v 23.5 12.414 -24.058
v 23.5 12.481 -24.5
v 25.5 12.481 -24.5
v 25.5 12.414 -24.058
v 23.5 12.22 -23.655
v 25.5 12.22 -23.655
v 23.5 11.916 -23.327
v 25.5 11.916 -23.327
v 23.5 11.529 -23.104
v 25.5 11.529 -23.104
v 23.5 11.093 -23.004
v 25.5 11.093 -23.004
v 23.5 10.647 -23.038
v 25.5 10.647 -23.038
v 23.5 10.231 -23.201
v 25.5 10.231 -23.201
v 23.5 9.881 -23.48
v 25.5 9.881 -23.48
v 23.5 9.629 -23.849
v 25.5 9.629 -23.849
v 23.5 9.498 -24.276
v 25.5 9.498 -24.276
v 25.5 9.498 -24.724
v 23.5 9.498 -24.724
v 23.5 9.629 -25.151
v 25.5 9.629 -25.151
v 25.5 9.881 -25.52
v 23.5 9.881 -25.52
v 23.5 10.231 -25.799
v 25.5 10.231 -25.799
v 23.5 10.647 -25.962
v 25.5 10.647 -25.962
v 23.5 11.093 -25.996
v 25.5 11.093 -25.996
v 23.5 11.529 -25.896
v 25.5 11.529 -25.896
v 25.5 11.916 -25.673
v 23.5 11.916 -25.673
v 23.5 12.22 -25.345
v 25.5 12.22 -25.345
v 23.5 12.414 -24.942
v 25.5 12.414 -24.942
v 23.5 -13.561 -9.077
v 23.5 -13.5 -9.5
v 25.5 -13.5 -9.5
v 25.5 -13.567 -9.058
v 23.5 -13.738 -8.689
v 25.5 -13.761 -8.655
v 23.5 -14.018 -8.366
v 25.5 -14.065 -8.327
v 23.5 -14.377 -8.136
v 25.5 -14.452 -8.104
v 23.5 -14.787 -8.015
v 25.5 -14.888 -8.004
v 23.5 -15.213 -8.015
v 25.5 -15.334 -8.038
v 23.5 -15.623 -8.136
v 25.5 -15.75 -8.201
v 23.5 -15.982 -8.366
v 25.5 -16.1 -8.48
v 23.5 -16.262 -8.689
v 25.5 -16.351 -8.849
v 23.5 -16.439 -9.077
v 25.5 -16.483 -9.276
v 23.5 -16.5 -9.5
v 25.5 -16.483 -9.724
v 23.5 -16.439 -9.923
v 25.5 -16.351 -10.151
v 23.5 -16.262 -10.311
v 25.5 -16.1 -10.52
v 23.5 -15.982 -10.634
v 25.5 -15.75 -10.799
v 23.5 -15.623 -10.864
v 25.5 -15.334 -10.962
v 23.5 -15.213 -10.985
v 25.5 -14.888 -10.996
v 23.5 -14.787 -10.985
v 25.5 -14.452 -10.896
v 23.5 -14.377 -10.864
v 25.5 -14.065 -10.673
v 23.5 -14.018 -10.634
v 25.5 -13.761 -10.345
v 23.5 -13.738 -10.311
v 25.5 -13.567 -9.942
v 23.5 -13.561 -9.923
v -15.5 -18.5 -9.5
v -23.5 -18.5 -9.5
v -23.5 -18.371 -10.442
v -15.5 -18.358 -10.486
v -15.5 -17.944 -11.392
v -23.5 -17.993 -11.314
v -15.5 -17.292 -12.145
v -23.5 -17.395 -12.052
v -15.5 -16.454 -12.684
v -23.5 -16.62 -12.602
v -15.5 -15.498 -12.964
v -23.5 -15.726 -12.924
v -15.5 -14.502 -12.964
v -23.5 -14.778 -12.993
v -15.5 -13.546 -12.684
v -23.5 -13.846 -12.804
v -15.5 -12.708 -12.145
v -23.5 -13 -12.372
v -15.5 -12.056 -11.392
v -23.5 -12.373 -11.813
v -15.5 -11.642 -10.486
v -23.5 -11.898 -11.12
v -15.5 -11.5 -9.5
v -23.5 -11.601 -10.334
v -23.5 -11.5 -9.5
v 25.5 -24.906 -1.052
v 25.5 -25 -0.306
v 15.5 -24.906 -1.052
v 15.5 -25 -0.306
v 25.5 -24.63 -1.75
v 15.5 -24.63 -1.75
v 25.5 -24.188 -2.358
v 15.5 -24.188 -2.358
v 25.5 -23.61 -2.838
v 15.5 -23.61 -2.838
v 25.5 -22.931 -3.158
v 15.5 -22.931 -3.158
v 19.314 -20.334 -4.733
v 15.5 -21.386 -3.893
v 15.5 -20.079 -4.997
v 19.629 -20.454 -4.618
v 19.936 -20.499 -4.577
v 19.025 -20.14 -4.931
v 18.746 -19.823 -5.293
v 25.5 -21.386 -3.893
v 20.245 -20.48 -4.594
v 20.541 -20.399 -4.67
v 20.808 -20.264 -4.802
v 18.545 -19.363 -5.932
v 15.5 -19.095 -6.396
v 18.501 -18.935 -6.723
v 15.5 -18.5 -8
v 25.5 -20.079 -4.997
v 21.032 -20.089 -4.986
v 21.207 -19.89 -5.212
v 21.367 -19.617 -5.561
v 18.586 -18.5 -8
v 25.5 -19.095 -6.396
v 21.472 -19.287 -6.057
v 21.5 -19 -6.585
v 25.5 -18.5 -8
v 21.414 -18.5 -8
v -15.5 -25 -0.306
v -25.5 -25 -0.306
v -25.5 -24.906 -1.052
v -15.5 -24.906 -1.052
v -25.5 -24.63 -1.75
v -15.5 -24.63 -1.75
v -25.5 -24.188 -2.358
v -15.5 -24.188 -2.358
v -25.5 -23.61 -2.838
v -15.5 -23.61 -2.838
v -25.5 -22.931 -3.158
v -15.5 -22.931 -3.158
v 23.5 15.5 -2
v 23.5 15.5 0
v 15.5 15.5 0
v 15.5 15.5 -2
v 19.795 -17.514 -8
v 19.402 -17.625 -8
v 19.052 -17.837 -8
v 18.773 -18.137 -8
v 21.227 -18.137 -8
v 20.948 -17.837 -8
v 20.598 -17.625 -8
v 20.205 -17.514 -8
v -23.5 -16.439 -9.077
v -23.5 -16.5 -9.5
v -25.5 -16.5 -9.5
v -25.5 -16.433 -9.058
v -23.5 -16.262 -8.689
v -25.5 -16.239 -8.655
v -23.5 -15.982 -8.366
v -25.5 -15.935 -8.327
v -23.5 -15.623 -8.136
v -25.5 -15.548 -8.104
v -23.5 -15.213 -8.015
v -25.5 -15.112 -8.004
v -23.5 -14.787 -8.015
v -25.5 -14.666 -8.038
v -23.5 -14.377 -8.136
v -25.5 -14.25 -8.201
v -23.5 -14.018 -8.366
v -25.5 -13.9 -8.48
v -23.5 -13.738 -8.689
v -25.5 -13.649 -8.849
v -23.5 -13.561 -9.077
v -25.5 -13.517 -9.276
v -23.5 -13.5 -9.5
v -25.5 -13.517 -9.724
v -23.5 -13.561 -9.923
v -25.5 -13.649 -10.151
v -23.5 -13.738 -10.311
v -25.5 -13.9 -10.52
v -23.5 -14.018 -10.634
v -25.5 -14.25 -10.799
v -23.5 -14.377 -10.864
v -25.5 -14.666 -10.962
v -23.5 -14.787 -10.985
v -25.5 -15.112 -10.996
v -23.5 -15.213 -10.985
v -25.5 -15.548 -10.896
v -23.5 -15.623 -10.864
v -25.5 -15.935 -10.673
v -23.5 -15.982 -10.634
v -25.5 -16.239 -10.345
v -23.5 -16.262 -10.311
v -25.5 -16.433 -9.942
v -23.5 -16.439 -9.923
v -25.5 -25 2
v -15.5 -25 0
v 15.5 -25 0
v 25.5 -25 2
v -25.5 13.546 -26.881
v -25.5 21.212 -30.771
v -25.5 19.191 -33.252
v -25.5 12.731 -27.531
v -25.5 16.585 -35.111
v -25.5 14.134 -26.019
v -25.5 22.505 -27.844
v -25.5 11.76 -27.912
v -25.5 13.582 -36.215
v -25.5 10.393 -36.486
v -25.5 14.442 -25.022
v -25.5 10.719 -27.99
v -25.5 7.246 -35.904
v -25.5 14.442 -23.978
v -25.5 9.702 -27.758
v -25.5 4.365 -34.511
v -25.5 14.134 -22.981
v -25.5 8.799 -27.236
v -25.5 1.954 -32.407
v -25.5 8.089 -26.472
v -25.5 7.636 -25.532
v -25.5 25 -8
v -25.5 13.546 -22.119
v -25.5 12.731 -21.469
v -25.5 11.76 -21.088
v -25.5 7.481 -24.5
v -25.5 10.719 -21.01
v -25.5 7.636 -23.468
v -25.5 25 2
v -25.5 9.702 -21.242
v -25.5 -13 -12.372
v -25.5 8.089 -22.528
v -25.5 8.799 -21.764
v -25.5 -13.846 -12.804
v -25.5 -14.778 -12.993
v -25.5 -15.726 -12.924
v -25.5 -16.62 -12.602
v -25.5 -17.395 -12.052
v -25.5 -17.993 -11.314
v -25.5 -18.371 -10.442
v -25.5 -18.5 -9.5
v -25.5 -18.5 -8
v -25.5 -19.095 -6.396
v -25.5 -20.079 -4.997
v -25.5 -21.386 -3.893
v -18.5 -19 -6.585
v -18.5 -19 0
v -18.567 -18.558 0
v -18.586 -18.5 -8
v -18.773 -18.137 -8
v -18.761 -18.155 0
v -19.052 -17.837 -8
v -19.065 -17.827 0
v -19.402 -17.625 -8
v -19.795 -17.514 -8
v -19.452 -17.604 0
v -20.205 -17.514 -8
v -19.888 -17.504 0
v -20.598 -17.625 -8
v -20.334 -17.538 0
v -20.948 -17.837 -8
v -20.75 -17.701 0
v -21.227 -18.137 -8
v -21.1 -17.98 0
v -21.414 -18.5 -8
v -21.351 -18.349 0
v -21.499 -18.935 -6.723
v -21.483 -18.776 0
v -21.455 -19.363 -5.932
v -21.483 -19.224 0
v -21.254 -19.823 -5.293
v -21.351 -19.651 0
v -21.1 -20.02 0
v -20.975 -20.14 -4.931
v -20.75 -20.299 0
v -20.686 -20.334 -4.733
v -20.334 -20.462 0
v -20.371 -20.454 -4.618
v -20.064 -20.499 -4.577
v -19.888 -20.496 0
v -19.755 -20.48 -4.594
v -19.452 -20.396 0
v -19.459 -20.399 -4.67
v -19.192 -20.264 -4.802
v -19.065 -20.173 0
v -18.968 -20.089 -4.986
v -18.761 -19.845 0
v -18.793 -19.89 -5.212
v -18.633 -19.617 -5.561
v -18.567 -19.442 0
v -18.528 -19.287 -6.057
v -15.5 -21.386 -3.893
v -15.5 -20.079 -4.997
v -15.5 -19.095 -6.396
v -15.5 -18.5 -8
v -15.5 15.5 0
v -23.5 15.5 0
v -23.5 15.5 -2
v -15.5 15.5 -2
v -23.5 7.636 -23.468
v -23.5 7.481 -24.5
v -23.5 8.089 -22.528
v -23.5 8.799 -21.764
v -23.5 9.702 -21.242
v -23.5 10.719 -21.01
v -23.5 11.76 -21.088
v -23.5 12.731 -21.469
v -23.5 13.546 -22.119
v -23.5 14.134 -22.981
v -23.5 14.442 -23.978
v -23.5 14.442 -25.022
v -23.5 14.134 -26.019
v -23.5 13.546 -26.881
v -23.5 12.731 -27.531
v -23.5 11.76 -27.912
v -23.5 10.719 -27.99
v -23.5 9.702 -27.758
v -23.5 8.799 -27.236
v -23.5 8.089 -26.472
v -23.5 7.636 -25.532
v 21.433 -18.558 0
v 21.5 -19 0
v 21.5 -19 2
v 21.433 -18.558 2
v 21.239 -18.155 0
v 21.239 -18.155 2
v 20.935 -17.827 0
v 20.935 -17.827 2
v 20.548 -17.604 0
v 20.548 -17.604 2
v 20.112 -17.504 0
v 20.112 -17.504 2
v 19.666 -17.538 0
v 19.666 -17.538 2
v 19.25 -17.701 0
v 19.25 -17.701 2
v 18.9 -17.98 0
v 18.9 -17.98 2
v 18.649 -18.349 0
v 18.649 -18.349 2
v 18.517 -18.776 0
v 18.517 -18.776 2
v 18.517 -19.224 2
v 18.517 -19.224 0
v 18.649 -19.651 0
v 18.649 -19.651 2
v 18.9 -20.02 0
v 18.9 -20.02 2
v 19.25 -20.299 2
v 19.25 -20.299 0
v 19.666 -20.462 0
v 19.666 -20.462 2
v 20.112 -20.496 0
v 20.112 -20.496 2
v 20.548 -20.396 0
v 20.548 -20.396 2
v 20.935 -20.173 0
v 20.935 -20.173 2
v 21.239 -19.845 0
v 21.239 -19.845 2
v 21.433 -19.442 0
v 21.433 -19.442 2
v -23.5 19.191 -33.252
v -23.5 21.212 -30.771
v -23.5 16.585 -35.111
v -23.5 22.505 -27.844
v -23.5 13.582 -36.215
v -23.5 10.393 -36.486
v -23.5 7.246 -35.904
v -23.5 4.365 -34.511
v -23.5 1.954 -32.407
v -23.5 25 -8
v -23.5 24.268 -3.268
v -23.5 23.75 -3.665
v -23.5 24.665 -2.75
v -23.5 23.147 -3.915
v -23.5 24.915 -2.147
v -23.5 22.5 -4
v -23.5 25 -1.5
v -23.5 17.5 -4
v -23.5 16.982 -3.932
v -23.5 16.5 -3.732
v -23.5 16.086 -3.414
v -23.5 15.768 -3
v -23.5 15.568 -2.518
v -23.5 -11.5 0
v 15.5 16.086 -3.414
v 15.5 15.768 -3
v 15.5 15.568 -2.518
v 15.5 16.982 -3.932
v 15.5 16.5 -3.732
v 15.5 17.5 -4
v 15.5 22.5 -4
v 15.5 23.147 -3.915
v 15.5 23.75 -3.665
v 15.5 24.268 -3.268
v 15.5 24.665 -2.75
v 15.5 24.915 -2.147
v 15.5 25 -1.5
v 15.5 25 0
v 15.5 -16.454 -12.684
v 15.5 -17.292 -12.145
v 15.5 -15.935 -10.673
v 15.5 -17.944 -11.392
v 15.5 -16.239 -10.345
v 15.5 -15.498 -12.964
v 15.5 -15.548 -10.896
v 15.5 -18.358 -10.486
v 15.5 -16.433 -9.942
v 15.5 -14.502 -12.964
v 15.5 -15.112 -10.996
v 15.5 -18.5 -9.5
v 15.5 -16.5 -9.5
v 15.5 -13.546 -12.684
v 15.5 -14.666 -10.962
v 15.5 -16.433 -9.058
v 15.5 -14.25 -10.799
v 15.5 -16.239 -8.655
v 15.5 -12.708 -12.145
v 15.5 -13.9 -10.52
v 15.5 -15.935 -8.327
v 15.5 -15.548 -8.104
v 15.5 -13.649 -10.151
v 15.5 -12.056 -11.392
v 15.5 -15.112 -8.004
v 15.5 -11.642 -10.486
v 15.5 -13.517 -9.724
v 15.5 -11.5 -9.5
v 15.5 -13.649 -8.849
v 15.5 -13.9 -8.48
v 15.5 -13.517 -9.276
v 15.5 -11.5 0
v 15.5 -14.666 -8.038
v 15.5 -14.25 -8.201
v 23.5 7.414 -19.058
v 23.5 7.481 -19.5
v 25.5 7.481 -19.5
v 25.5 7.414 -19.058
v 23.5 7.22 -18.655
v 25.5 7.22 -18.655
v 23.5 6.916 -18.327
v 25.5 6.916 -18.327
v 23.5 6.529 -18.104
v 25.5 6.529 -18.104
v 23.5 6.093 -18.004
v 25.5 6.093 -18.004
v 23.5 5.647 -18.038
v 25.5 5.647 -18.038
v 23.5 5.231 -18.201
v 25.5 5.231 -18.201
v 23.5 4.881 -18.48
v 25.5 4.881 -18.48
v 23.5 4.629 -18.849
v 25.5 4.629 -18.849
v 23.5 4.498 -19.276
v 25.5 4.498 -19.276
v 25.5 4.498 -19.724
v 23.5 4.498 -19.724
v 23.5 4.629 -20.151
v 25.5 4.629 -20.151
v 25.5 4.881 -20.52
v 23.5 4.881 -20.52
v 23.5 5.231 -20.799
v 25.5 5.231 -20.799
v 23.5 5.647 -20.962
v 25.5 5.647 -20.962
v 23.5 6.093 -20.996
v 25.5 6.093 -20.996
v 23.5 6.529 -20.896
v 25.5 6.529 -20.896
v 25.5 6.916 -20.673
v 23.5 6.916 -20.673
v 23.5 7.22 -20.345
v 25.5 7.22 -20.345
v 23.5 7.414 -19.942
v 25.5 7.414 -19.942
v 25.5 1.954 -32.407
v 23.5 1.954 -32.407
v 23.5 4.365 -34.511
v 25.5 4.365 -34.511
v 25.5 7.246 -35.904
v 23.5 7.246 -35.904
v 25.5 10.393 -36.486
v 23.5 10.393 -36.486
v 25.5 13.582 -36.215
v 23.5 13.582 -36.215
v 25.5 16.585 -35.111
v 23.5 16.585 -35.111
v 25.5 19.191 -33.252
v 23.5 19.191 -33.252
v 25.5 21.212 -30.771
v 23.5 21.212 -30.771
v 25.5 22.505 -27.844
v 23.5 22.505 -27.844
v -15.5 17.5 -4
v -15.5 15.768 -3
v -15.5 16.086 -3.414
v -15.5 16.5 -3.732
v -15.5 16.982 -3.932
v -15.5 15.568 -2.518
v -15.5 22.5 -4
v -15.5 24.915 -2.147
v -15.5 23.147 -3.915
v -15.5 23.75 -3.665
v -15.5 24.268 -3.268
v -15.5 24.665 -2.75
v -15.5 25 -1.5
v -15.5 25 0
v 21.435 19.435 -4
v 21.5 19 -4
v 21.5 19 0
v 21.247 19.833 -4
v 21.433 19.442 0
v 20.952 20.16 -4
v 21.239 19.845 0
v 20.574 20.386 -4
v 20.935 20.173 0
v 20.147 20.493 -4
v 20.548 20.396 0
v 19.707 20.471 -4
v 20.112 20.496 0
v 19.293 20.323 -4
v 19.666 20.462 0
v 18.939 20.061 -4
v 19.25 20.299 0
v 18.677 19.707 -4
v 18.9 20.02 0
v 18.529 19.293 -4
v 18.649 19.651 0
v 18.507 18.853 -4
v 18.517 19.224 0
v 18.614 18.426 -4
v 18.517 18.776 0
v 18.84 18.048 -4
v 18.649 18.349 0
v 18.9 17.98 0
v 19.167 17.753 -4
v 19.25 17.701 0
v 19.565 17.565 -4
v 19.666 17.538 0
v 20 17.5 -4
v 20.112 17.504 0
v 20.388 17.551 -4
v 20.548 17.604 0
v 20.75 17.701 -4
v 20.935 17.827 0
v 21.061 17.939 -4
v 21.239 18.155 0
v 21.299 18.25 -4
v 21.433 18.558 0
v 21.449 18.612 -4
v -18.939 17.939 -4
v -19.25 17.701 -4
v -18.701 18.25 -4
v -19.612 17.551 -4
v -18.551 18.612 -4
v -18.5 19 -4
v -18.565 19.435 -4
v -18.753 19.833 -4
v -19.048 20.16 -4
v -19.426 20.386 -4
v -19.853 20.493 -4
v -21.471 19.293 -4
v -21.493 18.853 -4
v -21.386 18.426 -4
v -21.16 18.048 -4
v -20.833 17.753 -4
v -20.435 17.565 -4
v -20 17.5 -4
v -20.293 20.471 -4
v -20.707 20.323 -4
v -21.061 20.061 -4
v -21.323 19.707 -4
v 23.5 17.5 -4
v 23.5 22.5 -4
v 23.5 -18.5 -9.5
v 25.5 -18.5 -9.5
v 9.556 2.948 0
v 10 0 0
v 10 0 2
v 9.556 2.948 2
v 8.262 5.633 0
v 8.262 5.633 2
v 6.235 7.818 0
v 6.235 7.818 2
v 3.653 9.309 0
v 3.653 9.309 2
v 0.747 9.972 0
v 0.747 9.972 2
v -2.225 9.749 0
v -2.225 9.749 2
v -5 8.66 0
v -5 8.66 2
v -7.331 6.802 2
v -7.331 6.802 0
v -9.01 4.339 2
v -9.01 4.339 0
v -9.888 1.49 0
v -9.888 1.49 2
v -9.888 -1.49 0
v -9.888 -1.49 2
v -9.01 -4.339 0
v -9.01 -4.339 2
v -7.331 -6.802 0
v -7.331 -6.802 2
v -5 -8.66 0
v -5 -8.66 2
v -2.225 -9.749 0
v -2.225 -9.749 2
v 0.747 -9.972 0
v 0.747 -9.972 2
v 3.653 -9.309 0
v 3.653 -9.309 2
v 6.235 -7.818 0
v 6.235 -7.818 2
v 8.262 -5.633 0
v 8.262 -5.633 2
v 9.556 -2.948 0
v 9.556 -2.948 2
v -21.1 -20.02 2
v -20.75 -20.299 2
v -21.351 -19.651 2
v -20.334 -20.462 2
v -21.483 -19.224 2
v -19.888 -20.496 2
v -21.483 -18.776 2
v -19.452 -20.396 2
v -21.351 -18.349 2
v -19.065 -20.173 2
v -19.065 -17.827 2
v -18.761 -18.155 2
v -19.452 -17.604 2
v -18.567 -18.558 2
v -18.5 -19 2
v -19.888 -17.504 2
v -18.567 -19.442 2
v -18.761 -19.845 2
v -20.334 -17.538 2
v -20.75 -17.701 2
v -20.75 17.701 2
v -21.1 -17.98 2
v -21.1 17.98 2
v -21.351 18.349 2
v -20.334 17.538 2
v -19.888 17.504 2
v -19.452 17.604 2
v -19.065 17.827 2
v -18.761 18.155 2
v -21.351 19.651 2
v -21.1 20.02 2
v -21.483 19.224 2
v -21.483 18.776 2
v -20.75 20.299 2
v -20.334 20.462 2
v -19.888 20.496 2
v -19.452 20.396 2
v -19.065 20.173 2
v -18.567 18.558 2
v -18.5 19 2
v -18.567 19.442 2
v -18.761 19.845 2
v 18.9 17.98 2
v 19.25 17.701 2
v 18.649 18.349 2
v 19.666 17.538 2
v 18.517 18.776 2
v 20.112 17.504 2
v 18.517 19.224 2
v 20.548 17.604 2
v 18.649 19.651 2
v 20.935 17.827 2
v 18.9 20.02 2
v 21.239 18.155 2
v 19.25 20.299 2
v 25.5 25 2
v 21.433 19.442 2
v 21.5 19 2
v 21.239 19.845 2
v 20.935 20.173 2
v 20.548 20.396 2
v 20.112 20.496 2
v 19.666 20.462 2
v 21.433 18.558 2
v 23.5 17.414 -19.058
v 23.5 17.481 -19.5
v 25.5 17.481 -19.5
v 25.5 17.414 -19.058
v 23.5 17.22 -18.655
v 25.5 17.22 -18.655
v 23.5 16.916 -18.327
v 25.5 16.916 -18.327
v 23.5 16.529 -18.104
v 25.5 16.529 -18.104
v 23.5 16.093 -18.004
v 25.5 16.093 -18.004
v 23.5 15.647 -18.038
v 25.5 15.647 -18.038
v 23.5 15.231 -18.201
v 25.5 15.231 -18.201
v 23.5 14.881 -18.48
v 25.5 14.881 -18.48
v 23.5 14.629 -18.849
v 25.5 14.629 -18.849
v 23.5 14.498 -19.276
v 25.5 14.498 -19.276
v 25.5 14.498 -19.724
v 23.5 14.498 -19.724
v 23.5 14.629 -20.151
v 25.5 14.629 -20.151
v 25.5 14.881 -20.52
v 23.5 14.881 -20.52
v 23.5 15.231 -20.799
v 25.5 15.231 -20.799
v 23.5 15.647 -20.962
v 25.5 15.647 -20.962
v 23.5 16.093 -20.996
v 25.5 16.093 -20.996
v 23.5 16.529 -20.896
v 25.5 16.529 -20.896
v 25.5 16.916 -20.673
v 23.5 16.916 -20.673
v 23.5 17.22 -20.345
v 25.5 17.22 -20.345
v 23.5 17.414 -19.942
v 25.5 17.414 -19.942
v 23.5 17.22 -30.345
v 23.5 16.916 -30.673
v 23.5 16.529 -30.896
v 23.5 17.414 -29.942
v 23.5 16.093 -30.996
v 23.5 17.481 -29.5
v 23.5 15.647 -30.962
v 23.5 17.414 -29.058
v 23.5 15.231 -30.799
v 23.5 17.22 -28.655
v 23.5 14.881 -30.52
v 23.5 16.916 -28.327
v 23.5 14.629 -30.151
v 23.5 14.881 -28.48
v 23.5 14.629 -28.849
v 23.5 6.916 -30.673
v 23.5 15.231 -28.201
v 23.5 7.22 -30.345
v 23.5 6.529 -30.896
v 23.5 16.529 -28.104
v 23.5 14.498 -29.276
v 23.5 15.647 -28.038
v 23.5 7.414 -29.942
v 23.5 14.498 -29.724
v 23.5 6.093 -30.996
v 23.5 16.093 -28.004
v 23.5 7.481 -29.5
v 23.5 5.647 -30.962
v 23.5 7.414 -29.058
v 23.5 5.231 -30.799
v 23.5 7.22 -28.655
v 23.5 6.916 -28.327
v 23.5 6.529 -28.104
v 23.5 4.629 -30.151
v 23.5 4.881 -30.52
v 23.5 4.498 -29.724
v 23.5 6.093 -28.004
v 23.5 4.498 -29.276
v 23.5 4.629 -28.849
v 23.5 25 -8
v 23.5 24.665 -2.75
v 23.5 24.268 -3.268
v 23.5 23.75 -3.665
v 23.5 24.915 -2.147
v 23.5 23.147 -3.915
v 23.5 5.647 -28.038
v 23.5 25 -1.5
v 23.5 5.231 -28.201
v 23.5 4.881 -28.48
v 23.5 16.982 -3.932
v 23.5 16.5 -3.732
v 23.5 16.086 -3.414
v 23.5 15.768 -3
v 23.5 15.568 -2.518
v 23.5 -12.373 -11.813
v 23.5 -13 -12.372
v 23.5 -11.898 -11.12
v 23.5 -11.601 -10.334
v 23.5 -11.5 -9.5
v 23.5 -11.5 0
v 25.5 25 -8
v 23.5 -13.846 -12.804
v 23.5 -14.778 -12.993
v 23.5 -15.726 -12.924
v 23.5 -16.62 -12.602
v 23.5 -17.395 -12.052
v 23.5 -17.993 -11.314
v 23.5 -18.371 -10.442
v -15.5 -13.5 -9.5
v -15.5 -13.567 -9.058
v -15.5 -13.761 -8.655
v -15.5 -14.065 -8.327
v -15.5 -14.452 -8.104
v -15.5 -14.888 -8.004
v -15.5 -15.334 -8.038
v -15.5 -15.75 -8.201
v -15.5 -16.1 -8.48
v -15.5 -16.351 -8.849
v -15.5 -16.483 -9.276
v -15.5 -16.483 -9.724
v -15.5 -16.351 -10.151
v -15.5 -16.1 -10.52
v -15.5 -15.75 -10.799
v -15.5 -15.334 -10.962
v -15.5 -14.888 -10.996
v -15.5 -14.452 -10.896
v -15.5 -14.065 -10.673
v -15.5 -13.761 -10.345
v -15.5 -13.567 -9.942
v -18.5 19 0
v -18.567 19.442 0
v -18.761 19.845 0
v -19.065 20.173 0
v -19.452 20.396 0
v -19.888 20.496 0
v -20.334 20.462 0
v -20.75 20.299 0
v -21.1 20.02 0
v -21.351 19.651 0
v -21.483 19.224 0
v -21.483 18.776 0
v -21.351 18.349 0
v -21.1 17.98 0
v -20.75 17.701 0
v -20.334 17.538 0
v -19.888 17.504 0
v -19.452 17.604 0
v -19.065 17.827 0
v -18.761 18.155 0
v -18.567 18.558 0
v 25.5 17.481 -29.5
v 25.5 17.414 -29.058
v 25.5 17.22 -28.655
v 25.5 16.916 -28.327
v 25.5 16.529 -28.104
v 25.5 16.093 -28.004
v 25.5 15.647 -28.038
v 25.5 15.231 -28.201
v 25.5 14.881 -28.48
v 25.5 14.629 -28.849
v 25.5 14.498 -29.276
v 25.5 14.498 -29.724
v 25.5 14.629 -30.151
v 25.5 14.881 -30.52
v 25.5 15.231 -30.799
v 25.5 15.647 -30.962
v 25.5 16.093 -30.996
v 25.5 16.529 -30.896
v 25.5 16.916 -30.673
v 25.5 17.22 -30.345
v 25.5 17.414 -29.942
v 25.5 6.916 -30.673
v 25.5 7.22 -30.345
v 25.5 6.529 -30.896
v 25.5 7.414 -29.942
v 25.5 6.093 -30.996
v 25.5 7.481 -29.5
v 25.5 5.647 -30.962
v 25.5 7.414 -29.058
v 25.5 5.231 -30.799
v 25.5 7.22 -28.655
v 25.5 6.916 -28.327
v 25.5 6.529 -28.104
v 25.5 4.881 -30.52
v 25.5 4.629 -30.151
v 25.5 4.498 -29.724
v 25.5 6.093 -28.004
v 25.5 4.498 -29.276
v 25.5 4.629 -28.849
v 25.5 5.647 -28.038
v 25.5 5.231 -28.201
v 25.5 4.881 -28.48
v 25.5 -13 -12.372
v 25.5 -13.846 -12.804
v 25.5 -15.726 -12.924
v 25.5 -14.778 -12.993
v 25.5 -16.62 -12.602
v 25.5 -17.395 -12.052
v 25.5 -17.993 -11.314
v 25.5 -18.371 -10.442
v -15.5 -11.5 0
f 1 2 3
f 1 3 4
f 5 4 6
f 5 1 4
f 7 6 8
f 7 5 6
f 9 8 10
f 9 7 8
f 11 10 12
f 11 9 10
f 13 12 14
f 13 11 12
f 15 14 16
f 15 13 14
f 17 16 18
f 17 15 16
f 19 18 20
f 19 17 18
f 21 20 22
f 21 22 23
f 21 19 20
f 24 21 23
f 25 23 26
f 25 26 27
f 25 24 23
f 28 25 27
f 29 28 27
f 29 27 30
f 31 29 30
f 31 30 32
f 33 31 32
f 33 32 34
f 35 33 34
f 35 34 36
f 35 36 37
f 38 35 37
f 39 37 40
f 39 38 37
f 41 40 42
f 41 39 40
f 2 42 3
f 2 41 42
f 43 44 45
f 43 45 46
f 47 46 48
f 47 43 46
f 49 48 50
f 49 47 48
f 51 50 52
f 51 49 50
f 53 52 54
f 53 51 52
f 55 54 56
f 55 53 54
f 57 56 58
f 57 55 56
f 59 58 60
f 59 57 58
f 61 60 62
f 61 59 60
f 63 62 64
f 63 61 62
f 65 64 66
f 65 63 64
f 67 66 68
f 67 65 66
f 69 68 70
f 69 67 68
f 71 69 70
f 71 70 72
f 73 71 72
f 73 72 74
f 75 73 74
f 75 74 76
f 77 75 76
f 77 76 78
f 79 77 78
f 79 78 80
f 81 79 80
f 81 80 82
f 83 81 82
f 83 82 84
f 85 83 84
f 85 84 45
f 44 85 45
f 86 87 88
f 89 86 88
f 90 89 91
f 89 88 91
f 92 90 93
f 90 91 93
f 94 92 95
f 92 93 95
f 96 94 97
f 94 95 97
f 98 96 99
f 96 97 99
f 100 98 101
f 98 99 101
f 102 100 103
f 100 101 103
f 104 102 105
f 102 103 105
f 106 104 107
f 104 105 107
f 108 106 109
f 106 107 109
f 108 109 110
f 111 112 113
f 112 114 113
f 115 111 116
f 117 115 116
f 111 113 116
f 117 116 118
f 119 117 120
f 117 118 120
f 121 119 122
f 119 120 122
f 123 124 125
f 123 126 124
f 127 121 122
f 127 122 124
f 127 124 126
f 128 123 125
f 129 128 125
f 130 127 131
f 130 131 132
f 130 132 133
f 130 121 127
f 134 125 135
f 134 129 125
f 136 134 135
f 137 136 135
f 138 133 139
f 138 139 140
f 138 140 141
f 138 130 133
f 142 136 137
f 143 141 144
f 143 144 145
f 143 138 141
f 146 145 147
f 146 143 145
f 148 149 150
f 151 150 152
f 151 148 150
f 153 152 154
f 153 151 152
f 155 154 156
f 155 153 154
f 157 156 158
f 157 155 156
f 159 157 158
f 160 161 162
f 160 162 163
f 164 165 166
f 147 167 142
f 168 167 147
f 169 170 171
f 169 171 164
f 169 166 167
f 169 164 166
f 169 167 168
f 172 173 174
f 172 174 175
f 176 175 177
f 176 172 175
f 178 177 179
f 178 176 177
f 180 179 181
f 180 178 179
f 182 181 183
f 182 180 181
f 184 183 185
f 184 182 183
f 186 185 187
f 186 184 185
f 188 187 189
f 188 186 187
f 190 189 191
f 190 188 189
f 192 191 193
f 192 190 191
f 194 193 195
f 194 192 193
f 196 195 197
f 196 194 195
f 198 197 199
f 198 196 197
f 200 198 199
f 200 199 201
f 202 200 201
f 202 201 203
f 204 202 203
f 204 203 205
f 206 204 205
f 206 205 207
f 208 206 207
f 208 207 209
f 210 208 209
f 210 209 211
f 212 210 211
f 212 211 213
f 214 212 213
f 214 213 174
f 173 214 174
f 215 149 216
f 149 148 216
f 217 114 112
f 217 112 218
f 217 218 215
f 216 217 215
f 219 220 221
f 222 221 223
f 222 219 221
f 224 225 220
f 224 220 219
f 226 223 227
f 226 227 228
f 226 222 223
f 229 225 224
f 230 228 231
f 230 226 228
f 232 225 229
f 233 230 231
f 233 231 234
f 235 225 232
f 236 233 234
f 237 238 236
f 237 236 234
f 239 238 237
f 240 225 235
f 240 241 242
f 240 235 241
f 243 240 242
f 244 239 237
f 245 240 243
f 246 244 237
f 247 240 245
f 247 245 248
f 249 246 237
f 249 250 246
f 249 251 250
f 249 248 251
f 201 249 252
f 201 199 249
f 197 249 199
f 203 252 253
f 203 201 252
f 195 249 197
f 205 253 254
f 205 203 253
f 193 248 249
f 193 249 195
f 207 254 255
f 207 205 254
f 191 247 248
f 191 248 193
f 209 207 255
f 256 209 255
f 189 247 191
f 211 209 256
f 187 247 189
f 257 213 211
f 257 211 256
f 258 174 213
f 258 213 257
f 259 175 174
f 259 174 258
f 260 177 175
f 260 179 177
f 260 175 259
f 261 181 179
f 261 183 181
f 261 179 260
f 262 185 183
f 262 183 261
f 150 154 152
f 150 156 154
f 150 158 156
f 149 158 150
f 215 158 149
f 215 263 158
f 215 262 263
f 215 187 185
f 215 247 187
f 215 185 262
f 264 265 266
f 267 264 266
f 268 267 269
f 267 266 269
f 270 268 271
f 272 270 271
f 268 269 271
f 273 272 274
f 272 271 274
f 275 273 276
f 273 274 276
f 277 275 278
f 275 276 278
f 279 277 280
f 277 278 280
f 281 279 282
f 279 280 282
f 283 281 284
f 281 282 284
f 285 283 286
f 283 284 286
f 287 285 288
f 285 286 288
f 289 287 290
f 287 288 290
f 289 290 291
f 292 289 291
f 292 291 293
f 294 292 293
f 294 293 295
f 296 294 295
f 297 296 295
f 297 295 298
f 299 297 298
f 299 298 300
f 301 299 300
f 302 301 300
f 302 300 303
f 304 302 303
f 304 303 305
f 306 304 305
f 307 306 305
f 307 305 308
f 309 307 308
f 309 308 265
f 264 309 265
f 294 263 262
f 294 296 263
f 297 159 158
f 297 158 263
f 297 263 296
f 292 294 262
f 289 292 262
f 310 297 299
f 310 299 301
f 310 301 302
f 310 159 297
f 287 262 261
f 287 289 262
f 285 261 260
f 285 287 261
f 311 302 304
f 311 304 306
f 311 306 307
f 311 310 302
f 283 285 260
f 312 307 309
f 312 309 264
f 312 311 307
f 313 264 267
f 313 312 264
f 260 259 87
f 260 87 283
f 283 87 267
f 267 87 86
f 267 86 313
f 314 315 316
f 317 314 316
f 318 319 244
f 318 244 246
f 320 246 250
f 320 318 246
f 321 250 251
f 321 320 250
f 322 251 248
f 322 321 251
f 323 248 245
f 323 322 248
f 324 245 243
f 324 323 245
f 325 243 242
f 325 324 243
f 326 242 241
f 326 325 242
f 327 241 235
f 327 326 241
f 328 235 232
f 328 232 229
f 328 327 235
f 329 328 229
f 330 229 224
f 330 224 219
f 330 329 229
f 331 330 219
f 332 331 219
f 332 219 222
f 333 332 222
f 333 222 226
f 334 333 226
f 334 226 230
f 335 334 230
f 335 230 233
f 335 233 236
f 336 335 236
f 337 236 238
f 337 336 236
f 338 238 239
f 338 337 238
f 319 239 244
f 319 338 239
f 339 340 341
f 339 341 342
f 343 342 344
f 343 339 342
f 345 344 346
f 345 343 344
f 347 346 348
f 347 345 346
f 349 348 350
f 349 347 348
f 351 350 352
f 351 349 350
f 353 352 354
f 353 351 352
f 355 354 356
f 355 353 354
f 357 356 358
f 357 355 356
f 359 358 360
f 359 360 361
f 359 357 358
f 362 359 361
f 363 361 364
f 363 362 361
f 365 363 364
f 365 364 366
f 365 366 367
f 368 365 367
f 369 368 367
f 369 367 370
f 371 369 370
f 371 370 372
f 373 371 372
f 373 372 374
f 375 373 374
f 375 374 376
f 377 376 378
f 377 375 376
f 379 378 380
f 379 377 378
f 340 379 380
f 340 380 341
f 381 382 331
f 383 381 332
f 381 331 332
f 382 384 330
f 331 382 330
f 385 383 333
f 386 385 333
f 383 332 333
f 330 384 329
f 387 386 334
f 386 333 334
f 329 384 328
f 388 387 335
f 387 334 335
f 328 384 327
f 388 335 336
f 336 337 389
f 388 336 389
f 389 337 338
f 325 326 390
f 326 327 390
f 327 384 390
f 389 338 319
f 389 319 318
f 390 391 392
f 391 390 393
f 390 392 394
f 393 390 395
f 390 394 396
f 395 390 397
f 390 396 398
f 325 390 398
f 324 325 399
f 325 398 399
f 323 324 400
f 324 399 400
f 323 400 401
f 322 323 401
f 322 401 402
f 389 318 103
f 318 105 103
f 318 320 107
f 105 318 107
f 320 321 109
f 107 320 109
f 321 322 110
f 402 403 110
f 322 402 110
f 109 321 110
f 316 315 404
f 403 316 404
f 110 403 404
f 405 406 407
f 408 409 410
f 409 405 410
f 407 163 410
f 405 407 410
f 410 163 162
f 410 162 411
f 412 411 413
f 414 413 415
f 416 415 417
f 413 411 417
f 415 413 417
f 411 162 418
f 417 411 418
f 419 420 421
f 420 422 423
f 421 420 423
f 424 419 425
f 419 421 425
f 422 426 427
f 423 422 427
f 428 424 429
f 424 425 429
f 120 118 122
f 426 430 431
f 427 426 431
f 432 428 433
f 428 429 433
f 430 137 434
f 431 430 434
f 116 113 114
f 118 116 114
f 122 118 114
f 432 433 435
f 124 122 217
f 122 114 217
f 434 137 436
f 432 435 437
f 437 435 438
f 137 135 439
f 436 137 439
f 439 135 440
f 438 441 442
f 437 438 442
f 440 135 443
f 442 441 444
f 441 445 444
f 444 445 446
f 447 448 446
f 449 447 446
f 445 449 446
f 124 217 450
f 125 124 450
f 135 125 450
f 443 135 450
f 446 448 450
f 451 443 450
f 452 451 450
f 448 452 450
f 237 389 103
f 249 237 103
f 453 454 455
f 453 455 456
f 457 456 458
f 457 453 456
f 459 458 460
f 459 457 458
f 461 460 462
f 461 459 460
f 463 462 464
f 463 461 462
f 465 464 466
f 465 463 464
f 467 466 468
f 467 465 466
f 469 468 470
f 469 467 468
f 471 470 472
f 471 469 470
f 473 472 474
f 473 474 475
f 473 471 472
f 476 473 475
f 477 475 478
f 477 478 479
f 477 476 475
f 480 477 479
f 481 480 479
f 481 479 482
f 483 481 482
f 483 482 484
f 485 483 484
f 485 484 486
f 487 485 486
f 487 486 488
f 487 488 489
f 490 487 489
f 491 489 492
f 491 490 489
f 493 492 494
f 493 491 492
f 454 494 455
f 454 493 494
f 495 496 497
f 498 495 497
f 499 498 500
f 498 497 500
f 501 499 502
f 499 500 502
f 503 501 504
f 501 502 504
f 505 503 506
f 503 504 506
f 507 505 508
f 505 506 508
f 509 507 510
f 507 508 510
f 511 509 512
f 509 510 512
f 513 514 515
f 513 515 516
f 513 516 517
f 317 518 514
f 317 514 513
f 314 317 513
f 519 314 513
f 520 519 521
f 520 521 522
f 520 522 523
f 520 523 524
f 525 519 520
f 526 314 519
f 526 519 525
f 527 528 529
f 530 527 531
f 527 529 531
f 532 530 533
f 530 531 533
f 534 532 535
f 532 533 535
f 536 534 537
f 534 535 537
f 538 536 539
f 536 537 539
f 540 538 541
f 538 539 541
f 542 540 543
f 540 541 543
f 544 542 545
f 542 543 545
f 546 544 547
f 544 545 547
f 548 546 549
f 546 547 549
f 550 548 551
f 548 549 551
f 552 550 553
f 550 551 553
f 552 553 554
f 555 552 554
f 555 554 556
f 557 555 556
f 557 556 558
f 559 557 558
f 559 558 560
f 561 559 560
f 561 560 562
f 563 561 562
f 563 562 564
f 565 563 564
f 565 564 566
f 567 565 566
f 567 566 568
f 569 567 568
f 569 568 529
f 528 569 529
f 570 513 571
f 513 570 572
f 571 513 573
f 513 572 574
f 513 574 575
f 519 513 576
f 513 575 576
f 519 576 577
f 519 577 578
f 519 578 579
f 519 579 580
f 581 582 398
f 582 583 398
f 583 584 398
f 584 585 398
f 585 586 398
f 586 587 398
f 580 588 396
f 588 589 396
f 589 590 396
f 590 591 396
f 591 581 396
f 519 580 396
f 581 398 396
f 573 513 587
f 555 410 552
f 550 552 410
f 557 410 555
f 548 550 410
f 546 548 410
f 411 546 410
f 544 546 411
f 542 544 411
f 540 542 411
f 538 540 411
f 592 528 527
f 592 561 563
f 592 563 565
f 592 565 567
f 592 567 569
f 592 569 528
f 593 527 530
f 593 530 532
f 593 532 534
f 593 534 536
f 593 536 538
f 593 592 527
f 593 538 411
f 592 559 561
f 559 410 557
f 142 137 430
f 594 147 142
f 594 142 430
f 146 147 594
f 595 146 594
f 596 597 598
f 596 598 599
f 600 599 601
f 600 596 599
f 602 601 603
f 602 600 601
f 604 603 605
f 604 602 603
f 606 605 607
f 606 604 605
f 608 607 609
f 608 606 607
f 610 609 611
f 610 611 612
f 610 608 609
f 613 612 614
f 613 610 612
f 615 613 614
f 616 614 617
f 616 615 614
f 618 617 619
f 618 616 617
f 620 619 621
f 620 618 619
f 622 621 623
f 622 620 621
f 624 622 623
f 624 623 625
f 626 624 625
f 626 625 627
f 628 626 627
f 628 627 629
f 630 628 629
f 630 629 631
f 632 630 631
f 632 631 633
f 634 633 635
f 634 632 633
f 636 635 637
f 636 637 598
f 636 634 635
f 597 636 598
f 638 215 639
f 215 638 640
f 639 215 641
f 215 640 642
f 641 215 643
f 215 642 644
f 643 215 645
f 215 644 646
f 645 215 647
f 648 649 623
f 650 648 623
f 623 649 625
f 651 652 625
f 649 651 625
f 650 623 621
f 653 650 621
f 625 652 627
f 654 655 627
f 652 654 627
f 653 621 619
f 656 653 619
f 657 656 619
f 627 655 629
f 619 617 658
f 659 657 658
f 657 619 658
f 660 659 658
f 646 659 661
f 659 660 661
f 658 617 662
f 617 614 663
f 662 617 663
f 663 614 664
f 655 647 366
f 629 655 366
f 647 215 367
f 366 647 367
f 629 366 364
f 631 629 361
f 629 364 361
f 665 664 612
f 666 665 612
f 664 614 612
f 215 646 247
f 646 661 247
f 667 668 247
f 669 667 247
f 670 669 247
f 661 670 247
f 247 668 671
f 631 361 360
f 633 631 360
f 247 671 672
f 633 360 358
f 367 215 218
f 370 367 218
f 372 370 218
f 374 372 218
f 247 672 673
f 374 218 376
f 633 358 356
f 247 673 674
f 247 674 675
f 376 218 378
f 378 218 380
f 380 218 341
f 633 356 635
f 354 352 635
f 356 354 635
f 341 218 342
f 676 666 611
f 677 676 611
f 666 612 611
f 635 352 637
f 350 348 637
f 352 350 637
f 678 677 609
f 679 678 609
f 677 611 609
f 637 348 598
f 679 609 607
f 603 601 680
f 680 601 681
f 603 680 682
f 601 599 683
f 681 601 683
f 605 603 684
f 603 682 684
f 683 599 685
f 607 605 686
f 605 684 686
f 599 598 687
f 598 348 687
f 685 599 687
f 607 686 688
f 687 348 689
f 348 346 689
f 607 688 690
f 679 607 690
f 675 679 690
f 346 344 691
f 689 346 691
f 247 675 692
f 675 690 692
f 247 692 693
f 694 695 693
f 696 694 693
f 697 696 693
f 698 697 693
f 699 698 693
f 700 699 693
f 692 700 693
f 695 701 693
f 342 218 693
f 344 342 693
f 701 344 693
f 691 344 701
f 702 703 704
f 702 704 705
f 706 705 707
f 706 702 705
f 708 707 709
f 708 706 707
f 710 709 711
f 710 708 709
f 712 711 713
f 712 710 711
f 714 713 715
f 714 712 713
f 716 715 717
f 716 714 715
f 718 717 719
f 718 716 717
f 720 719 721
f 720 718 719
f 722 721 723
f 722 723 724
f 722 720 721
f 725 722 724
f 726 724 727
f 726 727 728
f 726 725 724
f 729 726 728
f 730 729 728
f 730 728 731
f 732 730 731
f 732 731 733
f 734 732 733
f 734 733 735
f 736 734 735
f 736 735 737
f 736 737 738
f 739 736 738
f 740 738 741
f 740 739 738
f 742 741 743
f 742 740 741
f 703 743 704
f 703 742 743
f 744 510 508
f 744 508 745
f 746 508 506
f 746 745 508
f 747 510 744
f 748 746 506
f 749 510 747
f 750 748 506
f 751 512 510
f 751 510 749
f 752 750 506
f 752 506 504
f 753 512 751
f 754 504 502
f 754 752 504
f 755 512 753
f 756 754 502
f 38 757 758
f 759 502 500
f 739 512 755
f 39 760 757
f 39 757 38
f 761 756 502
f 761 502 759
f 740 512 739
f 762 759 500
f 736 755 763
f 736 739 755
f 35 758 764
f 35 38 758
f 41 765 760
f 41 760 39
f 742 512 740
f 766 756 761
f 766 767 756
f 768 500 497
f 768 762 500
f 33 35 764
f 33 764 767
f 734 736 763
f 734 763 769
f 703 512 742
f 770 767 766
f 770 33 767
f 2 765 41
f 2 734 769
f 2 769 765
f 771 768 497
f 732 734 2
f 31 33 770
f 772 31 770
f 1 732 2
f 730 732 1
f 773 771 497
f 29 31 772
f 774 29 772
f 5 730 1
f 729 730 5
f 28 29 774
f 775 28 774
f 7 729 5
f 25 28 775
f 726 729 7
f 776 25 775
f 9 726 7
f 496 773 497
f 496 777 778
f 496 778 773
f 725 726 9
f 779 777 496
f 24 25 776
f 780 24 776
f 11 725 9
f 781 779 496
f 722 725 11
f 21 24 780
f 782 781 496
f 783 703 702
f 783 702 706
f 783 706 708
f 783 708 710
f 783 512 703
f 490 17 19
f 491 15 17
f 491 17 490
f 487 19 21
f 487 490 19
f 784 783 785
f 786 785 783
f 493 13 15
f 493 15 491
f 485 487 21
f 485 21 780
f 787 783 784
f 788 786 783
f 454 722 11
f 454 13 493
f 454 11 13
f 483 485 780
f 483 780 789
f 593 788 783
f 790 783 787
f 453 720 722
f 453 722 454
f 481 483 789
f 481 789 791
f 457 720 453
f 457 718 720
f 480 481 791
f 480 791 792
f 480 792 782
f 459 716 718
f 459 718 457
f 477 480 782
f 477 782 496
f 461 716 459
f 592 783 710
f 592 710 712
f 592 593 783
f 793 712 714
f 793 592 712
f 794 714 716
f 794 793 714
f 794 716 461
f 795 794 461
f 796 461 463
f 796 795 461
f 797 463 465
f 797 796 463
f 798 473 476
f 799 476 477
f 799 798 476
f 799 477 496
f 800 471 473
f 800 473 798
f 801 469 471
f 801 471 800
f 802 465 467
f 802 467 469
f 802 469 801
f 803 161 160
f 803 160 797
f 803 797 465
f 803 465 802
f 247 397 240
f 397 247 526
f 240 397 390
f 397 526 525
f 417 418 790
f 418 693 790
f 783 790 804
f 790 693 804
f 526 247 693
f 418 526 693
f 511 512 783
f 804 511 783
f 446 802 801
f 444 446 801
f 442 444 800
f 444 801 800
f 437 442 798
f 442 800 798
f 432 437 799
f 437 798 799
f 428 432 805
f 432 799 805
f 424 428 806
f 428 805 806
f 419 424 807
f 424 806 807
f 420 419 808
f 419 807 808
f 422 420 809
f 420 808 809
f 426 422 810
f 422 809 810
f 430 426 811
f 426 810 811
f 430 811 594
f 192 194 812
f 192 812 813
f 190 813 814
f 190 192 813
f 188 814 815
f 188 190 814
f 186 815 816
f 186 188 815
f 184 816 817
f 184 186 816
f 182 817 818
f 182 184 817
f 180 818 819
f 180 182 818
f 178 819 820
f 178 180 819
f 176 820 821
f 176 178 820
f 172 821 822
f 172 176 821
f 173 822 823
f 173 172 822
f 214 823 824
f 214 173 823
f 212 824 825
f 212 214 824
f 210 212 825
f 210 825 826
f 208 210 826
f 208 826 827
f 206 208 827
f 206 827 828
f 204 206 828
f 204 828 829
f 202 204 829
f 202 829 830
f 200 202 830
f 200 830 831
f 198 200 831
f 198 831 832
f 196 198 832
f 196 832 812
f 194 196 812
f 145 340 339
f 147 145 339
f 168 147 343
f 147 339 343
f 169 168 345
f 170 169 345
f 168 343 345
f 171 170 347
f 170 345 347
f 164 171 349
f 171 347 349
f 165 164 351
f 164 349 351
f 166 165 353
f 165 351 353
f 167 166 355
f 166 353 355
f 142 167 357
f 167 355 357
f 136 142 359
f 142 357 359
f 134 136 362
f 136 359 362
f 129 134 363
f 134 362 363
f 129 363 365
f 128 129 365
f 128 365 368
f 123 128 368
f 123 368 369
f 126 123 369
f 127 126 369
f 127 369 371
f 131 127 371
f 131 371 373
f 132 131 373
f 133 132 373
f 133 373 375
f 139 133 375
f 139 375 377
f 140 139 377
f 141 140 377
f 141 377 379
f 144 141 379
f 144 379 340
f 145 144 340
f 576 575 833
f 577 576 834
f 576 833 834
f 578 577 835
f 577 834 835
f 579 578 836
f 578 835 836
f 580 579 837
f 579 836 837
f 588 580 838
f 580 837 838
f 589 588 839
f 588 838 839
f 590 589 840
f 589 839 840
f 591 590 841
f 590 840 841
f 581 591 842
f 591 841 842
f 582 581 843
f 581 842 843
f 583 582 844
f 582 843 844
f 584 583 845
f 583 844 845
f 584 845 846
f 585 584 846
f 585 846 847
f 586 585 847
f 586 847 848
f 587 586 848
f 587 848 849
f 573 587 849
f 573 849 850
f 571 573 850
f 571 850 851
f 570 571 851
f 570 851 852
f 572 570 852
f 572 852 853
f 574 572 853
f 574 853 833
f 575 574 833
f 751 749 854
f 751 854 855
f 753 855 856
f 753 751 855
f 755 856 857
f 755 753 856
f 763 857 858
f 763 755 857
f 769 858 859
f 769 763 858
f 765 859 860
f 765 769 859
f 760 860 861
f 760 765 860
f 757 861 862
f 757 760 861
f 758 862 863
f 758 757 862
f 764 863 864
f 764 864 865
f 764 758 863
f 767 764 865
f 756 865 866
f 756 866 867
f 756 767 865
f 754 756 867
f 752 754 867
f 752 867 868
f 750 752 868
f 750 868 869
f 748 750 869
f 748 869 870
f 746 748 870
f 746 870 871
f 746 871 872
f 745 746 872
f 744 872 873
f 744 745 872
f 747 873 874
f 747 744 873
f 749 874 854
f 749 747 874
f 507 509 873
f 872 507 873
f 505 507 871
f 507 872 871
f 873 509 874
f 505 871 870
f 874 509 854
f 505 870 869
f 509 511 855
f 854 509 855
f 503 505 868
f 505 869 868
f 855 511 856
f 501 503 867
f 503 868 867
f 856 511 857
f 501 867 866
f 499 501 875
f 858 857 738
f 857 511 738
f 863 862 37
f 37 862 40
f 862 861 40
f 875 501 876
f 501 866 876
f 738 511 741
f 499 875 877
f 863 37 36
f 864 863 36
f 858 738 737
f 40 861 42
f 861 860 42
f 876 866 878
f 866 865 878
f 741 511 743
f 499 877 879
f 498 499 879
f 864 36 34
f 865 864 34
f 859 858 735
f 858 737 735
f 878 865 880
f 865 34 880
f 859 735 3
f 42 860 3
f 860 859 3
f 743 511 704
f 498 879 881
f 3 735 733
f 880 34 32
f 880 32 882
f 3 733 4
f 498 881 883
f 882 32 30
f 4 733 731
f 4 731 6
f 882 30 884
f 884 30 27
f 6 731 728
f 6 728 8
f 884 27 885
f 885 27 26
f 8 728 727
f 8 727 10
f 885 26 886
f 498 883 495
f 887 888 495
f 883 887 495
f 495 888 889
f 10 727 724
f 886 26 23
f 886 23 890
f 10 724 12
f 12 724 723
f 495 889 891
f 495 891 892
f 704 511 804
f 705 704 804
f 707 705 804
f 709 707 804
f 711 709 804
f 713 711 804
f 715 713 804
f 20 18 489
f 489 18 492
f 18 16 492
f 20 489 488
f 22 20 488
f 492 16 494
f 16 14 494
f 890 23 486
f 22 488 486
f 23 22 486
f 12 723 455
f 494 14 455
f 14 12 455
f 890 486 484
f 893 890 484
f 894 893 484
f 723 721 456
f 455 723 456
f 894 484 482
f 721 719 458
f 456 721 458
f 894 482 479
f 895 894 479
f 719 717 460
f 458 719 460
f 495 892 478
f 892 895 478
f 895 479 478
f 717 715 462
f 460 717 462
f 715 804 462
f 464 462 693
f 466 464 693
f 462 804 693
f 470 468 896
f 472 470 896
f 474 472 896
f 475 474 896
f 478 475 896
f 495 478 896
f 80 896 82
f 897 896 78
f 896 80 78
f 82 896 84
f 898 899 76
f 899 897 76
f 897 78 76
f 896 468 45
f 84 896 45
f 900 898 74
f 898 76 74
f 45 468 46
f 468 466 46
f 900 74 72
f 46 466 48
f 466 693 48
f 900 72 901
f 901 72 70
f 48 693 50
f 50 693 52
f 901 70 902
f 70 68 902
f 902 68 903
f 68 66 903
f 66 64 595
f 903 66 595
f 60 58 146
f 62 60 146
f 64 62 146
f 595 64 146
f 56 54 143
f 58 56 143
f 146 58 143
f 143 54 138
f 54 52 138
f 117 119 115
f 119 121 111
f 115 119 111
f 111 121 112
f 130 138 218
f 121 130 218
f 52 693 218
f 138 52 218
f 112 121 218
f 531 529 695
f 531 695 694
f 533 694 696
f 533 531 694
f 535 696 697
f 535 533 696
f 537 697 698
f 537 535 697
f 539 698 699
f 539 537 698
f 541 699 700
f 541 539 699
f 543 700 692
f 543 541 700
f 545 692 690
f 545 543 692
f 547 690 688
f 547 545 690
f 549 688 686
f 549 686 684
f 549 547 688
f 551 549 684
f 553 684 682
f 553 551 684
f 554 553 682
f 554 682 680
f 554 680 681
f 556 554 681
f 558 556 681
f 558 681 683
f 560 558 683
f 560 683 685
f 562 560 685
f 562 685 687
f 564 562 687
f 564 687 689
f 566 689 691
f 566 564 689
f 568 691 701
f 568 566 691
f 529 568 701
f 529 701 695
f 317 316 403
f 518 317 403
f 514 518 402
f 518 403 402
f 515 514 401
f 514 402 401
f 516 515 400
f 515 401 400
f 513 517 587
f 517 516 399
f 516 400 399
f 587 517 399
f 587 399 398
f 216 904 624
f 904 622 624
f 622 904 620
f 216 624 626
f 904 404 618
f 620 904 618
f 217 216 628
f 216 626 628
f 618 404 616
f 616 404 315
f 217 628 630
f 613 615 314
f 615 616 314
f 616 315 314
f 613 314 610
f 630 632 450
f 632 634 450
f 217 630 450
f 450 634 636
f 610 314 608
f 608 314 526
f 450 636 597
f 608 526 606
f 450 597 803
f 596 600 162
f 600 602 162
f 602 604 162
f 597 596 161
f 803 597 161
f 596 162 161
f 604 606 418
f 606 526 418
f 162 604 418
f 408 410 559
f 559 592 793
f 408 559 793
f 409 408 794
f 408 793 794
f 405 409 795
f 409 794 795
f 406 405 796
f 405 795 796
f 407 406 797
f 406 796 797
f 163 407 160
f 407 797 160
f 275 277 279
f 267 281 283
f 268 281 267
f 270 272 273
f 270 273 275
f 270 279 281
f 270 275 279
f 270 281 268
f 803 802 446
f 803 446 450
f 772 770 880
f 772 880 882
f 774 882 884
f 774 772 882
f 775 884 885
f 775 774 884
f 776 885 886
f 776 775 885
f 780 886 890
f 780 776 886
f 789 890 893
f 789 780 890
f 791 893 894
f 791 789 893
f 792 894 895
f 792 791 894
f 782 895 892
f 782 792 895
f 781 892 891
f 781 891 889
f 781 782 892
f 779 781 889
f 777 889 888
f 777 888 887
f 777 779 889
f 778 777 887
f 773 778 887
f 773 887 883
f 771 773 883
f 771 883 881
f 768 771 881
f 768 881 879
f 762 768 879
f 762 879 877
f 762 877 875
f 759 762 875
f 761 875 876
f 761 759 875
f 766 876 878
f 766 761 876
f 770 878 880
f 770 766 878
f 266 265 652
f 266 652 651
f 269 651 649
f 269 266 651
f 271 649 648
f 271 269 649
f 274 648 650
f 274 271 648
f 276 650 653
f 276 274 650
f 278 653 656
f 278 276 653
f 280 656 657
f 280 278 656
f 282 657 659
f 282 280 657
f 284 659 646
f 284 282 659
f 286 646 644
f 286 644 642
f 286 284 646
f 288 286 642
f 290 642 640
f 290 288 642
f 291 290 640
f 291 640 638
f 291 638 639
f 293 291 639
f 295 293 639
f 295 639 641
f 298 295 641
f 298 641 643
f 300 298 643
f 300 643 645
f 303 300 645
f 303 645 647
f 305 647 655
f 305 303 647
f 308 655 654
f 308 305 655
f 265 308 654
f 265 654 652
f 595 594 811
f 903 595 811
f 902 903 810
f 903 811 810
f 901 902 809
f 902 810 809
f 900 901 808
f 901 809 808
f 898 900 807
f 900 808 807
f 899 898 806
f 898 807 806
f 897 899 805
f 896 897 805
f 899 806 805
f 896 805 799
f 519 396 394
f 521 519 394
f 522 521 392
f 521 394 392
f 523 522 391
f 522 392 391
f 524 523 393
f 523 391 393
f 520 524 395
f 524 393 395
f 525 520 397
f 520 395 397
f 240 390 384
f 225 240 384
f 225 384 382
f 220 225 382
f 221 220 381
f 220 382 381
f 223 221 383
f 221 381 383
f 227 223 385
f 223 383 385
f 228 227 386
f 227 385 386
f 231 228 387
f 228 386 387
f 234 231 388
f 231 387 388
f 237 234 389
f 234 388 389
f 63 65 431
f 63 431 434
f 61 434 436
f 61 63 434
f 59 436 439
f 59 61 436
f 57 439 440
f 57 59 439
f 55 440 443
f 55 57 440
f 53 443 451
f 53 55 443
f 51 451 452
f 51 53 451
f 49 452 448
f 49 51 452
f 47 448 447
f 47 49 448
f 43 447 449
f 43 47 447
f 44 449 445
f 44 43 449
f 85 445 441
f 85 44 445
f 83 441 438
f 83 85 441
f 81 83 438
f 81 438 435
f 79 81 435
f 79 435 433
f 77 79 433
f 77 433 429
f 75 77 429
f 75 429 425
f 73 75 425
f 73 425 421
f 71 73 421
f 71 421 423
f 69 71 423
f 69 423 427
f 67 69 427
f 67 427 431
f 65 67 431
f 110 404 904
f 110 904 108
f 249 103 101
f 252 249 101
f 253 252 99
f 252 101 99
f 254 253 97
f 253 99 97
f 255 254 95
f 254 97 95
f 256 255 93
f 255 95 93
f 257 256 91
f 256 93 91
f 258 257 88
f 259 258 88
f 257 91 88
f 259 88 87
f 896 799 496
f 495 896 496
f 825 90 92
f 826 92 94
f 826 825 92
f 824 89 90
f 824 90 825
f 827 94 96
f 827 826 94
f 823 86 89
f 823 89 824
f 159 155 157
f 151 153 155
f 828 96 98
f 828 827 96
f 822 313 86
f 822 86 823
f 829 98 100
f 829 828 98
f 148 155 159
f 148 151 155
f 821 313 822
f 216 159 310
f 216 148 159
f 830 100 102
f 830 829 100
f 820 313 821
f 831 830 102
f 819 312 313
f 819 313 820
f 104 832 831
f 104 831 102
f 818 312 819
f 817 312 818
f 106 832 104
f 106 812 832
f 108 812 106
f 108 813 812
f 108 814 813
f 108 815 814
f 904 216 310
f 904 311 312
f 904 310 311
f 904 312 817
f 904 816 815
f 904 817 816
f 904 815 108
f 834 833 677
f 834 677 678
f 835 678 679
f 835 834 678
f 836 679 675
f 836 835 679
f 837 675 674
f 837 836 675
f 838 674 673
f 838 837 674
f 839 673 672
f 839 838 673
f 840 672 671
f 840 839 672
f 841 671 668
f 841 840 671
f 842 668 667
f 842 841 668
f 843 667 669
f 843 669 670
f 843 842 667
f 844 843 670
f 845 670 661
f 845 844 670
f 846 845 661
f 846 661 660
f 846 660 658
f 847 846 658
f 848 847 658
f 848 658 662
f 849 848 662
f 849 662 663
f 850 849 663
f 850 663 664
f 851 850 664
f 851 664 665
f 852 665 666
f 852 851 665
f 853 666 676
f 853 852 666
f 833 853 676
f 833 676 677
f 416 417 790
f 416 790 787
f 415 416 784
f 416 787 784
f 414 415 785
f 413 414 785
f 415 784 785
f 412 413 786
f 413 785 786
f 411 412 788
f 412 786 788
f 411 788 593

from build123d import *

# Parameters (mm, degrees)
SKETCH_W        = 47
SKETCH_H        = 50
SKETCH_R        = 10
SKETCH_R_2      = 1.5
PAD_DEPTH       = 2
SKETCH001_R     = 1.5
PAD001_DEPTH    = 2
SKETCH002_R     = 1.5
PAD002_DEPTH    = 8
SKETCH004_R     = 1.5
POCKET_DEPTH    = 8
PAD003_DEPTH    = 8
SKETCH005_R     = 1.5
POCKET001_DEPTH = 4
SKETCH006_R     = 1.5
SKETCH006_R_2   = 3.5
PAD004_DEPTH    = 2
SKETCH007_R     = 1.5
PAD005_DEPTH    = 8
SKETCH008_R     = 1.5
POCKET002_DEPTH = 8
PAD006_DEPTH    = 8
SKETCH010_R     = 1.5
POCKET003_DEPTH = 4
FILLET_R        = 3


with BuildPart() as part:
    # Sketch → Pad (new body)
    with BuildSketch(Plane.XY):
        Rectangle(SKETCH_W, SKETCH_H)
        Circle(SKETCH_R, mode=Mode.SUBTRACT)
        with Locations((-20, -19)):
            Circle(SKETCH_R_2, mode=Mode.SUBTRACT)
        with Locations((20, -19)):
            Circle(SKETCH_R_2, mode=Mode.SUBTRACT)
        with Locations((-20, 19)):
            Circle(SKETCH_R_2, mode=Mode.SUBTRACT)
        with Locations((20, 19)):
            Circle(SKETCH_R_2, mode=Mode.SUBTRACT)
    extrude(amount=PAD_DEPTH)

    # Sketch001 (on Face2 of Pad) → Pad001 (join)
    with BuildSketch(Plane.YZ.offset(23.5)):
        with BuildLine():
            Line((-25, 2), (25, 2))
            Line((25, -8), (25, 2))
            Line((22.505468, -27.843823), (25, -8))
            ThreePointArc((1.953944, -32.406741), (13.581707, -36.214738), (22.505468, -27.843823))
            Line((-13, -12.372281), (1.953944, -32.406741))
            ThreePointArc((-18.5, -9.5), (-16.620185, -12.602418), (-13, -12.372281))
            Line((-18.5, -8), (-18.5, -9.5))
            ThreePointArc((-18.5, -8), (-20.847064, -4.279548), (-25, -2.829168))
            Line((-25, 2), (-25, -2.829168))
        make_face()
        with Locations((-15, -9.5)):
            Circle(SKETCH001_R, mode=Mode.SUBTRACT)
        with Locations((15.980762, -19.5)):
            Circle(SKETCH001_R, mode=Mode.SUBTRACT)
        with Locations((5.980762, -19.5)):
            Circle(SKETCH001_R, mode=Mode.SUBTRACT)
        with Locations((10.980762, -24.5)):
            Circle(SKETCH001_R, mode=Mode.SUBTRACT)
        with Locations((15.980762, -29.5)):
            Circle(SKETCH001_R, mode=Mode.SUBTRACT)
        with Locations((5.980762, -29.5)):
            Circle(SKETCH001_R, mode=Mode.SUBTRACT)
    extrude(amount=PAD001_DEPTH)

    # Sketch002 (on Face9 of Pad001) → Pad002 (join)
    with BuildSketch(Plane(origin=(23.5, 0, 0), x_dir=(0, -1, 0), z_dir=(-1, 0, 0))):
        with BuildLine():
            Line((18.5, -8), (18.5, -9.5))
            ThreePointArc((11.5, -9.5), (15, -13), (18.5, -9.5))
            Line((11.5, -9.5), (11.5, 0))
            Line((25, 0), (11.5, 0))
            Line((25, 0), (25, -2.829168))
            ThreePointArc((25, -2.829168), (20.847064, -4.279548), (18.5, -8))
        make_face()
        with Locations((15, -9.5)):
            Circle(SKETCH002_R, mode=Mode.SUBTRACT)
    extrude(amount=PAD002_DEPTH)

    # Sketch004 (on Face35 of Pad002) → Pocket (cut)
    with BuildSketch(Plane.XY):
        with Locations((20, -19)):
            Circle(SKETCH004_R)
    extrude(amount=-POCKET_DEPTH, mode=Mode.SUBTRACT)

    # Sketch003 (on Face9 of Pad002) → Pad003 (join)
    with BuildSketch(Plane(origin=(23.5, 0, 0), x_dir=(0, -1, 0), z_dir=(-1, 0, 0))):
        with BuildLine():
            Line((-25, 0), (-15.5, 0))
            Line((-15.5, 0), (-15.5, -2))
            ThreePointArc((-17.5, -4), (-16.085786, -3.414214), (-15.5, -2))
            Line((-17.5, -4), (-22.5, -4))
            ThreePointArc((-25, -1.5), (-24.267767, -3.267767), (-22.5, -4))
            Line((-25, 0), (-25, -1.5))
        make_face()
    extrude(amount=PAD003_DEPTH)

    # Sketch005 (on Face41 of Pad003) → Pocket001 (cut)
    with BuildSketch(Plane.XY):
        with Locations((20, 19)):
            Circle(SKETCH005_R)
    extrude(amount=-POCKET001_DEPTH, mode=Mode.SUBTRACT)

    # Sketch006 (on Face2 of Pocket001) → Pad004 (join)
    with BuildSketch(Plane(origin=(-23.5, 0, 0), x_dir=(0, -1, 0), z_dir=(-1, 0, 0))):
        with BuildLine():
            Line((25, 2), (-25, 2))
            Line((-25, 2), (-25, -8))
            Line((-25, -8), (-22.505468, -27.843823))
            ThreePointArc((-22.505468, -27.843823), (-13.581707, -36.214738), (-1.953944, -32.406741))
            Line((-1.953944, -32.406741), (13, -12.372281))
            ThreePointArc((13, -12.372281), (16.620185, -12.602418), (18.5, -9.5))
            Line((18.5, -9.5), (18.5, -8))
            ThreePointArc((25, -2.829168), (20.847064, -4.279548), (18.5, -8))
            Line((25, -2.829168), (25, 2))
        make_face()
        with Locations((15, -9.5)):
            Circle(SKETCH006_R, mode=Mode.SUBTRACT)
        with Locations((-10.980762, -24.5)):
            Circle(SKETCH006_R_2, mode=Mode.SUBTRACT)
    extrude(amount=PAD004_DEPTH)

    # Sketch007 (on Face9 of Pad004) → Pad005 (join)
    with BuildSketch(Plane.YZ.offset(-23.5)):
        with BuildLine():
            Line((-11.5, 0), (-25, 0))
            Line((-25, 0), (-25, -2.829168))
            ThreePointArc((-18.5, -8), (-20.847064, -4.279548), (-25, -2.829168))
            Line((-18.5, -8), (-18.5, -9.5))
            ThreePointArc((-18.5, -9.5), (-15, -13), (-11.5, -9.5))
            Line((-11.5, 0), (-11.5, -9.5))
        make_face()
        with Locations((-15, -9.5)):
            Circle(SKETCH007_R, mode=Mode.SUBTRACT)
    extrude(amount=PAD005_DEPTH)

    # Sketch008 (on Face62 of Pad005) → Pocket002 (cut)
    with BuildSketch(Plane.XY):
        with Locations((-20, -19)):
            Circle(SKETCH008_R)
    extrude(amount=-POCKET002_DEPTH, mode=Mode.SUBTRACT)

    # Sketch009 (on Face9 of Pocket002) → Pad006 (join)
    with BuildSketch(Plane.YZ.offset(-23.5)):
        with BuildLine():
            Line((25, 0), (15.5, 0))
            Line((15.5, 0), (15.5, -2))
            ThreePointArc((15.5, -2), (16.085786, -3.414214), (17.5, -4))
            Line((17.5, -4), (22.5, -4))
            ThreePointArc((22.5, -4), (24.267767, -3.267767), (25, -1.5))
            Line((25, -1.5), (25, 0))
        make_face()
    extrude(amount=PAD006_DEPTH)

    # Sketch010 (on Face67 of Pad006) → Pocket003 (cut)
    with BuildSketch(Plane.XY):
        with Locations((-20, 19)):
            Circle(SKETCH010_R)
    extrude(amount=-POCKET003_DEPTH, mode=Mode.SUBTRACT)

    # Fillet
    fillet_edges = [part.edges().sort_by_distance(p)[0] for p in [
        (-19.5, -25, -2.829168),
        (-24.5, -25, -2.829168),
        (19.5, -25, -2.829168),
        (24.5, -25, -2.829168),
    ]]
    fillet(fillet_edges, radius=FILLET_R)


solid = part.part
